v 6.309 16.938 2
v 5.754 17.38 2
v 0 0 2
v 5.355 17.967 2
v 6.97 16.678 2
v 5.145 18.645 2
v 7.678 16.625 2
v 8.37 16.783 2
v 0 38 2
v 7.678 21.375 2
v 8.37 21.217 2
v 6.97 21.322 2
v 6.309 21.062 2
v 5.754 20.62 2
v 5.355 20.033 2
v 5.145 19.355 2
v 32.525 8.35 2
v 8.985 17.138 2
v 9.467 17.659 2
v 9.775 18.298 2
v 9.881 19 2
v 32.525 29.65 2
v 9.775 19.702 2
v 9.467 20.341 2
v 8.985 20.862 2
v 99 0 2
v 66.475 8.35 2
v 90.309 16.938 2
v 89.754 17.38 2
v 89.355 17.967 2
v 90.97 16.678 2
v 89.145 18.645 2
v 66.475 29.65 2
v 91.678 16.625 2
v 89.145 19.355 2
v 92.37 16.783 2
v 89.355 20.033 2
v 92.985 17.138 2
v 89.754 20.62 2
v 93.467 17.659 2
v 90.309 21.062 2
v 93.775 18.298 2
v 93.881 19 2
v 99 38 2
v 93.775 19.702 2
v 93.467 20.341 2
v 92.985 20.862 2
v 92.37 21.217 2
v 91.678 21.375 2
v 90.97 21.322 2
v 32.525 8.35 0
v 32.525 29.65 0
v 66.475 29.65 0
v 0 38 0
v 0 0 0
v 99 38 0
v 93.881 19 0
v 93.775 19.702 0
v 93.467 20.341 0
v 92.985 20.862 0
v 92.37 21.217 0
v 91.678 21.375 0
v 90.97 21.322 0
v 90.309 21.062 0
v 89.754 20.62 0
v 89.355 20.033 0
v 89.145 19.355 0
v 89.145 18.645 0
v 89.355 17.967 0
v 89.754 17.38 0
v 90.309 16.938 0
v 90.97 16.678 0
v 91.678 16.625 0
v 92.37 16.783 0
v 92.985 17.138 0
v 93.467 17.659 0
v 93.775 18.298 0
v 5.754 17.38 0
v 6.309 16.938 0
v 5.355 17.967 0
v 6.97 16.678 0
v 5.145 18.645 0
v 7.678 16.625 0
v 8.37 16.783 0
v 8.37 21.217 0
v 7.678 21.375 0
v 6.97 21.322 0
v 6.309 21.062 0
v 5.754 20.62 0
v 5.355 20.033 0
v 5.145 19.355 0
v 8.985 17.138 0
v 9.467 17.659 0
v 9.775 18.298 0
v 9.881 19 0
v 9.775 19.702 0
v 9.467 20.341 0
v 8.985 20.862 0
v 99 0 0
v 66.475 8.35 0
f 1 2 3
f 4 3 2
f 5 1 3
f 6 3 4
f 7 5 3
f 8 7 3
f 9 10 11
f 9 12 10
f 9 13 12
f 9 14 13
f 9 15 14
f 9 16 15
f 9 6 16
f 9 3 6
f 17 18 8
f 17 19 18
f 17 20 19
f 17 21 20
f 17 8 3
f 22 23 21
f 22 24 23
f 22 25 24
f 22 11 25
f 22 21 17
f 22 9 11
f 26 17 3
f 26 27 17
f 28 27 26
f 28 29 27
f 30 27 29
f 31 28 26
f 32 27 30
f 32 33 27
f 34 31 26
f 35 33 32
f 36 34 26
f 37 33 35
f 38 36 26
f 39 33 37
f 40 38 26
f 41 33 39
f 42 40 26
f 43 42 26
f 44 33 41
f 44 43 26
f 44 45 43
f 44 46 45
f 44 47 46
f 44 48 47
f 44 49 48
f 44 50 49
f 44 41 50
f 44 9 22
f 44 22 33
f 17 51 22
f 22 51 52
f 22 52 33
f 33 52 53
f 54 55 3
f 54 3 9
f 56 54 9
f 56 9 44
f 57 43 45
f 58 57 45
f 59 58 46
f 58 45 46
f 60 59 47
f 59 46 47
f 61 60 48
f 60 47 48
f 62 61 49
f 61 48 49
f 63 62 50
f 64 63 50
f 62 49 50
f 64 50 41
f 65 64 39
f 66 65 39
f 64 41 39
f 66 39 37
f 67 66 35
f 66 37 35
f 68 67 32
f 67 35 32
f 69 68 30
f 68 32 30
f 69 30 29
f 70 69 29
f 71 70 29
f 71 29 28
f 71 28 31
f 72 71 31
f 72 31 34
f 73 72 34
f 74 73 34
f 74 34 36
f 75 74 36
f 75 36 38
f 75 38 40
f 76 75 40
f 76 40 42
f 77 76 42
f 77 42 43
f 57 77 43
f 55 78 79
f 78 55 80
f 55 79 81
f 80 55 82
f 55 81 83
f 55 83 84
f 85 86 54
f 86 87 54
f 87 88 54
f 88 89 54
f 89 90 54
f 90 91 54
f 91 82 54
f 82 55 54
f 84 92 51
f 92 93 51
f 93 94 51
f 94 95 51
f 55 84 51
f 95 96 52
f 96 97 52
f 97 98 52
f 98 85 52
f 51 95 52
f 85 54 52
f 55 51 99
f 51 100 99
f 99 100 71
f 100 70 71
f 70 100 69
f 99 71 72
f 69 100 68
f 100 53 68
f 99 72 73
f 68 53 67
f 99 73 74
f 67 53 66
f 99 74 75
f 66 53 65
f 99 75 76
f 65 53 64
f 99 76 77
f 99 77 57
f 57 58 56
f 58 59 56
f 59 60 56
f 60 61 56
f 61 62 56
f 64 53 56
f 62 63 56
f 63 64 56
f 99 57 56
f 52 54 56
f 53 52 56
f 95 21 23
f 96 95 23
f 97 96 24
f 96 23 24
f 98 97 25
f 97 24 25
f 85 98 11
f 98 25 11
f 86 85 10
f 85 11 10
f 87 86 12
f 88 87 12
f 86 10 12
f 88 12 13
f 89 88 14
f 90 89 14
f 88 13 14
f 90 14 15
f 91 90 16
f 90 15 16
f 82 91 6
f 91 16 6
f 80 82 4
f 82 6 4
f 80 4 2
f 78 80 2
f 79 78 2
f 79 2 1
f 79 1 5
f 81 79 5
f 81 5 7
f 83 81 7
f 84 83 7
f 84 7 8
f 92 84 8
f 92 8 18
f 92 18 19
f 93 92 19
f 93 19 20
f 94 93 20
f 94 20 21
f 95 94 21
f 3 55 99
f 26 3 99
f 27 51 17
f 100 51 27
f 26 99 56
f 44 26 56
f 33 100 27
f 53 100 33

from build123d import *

# Parameters (mm, degrees)
F0_W     = 99
F0_H     = 38
F0_W_2   = 33.95
F0_H_2   = 21.3
F1_DEPTH = 2
F2_R     = 2.38125
F3_DEPTH = 2.001


with BuildPart() as f1:
    # F0 (on Top) → F1 (new body)
    with BuildSketch(Plane.XY):
        with Locations((49.5, 19)):
            Rectangle(F0_W, F0_H)
        with Locations((49.5, 19)):
            Rectangle(F0_W_2, F0_H_2, mode=Mode.SUBTRACT)
    extrude(amount=F1_DEPTH)

    # F2 (on face) → F3 (cut, through all)
    with BuildSketch(Plane.XY.offset(2)):
        with Locations((7.5, 19)):
            Circle(F2_R)
        with Locations((91.5, 19)):
            Circle(F2_R)
    extrude(amount=-F3_DEPTH, mode=Mode.SUBTRACT)


solid = f1.part
